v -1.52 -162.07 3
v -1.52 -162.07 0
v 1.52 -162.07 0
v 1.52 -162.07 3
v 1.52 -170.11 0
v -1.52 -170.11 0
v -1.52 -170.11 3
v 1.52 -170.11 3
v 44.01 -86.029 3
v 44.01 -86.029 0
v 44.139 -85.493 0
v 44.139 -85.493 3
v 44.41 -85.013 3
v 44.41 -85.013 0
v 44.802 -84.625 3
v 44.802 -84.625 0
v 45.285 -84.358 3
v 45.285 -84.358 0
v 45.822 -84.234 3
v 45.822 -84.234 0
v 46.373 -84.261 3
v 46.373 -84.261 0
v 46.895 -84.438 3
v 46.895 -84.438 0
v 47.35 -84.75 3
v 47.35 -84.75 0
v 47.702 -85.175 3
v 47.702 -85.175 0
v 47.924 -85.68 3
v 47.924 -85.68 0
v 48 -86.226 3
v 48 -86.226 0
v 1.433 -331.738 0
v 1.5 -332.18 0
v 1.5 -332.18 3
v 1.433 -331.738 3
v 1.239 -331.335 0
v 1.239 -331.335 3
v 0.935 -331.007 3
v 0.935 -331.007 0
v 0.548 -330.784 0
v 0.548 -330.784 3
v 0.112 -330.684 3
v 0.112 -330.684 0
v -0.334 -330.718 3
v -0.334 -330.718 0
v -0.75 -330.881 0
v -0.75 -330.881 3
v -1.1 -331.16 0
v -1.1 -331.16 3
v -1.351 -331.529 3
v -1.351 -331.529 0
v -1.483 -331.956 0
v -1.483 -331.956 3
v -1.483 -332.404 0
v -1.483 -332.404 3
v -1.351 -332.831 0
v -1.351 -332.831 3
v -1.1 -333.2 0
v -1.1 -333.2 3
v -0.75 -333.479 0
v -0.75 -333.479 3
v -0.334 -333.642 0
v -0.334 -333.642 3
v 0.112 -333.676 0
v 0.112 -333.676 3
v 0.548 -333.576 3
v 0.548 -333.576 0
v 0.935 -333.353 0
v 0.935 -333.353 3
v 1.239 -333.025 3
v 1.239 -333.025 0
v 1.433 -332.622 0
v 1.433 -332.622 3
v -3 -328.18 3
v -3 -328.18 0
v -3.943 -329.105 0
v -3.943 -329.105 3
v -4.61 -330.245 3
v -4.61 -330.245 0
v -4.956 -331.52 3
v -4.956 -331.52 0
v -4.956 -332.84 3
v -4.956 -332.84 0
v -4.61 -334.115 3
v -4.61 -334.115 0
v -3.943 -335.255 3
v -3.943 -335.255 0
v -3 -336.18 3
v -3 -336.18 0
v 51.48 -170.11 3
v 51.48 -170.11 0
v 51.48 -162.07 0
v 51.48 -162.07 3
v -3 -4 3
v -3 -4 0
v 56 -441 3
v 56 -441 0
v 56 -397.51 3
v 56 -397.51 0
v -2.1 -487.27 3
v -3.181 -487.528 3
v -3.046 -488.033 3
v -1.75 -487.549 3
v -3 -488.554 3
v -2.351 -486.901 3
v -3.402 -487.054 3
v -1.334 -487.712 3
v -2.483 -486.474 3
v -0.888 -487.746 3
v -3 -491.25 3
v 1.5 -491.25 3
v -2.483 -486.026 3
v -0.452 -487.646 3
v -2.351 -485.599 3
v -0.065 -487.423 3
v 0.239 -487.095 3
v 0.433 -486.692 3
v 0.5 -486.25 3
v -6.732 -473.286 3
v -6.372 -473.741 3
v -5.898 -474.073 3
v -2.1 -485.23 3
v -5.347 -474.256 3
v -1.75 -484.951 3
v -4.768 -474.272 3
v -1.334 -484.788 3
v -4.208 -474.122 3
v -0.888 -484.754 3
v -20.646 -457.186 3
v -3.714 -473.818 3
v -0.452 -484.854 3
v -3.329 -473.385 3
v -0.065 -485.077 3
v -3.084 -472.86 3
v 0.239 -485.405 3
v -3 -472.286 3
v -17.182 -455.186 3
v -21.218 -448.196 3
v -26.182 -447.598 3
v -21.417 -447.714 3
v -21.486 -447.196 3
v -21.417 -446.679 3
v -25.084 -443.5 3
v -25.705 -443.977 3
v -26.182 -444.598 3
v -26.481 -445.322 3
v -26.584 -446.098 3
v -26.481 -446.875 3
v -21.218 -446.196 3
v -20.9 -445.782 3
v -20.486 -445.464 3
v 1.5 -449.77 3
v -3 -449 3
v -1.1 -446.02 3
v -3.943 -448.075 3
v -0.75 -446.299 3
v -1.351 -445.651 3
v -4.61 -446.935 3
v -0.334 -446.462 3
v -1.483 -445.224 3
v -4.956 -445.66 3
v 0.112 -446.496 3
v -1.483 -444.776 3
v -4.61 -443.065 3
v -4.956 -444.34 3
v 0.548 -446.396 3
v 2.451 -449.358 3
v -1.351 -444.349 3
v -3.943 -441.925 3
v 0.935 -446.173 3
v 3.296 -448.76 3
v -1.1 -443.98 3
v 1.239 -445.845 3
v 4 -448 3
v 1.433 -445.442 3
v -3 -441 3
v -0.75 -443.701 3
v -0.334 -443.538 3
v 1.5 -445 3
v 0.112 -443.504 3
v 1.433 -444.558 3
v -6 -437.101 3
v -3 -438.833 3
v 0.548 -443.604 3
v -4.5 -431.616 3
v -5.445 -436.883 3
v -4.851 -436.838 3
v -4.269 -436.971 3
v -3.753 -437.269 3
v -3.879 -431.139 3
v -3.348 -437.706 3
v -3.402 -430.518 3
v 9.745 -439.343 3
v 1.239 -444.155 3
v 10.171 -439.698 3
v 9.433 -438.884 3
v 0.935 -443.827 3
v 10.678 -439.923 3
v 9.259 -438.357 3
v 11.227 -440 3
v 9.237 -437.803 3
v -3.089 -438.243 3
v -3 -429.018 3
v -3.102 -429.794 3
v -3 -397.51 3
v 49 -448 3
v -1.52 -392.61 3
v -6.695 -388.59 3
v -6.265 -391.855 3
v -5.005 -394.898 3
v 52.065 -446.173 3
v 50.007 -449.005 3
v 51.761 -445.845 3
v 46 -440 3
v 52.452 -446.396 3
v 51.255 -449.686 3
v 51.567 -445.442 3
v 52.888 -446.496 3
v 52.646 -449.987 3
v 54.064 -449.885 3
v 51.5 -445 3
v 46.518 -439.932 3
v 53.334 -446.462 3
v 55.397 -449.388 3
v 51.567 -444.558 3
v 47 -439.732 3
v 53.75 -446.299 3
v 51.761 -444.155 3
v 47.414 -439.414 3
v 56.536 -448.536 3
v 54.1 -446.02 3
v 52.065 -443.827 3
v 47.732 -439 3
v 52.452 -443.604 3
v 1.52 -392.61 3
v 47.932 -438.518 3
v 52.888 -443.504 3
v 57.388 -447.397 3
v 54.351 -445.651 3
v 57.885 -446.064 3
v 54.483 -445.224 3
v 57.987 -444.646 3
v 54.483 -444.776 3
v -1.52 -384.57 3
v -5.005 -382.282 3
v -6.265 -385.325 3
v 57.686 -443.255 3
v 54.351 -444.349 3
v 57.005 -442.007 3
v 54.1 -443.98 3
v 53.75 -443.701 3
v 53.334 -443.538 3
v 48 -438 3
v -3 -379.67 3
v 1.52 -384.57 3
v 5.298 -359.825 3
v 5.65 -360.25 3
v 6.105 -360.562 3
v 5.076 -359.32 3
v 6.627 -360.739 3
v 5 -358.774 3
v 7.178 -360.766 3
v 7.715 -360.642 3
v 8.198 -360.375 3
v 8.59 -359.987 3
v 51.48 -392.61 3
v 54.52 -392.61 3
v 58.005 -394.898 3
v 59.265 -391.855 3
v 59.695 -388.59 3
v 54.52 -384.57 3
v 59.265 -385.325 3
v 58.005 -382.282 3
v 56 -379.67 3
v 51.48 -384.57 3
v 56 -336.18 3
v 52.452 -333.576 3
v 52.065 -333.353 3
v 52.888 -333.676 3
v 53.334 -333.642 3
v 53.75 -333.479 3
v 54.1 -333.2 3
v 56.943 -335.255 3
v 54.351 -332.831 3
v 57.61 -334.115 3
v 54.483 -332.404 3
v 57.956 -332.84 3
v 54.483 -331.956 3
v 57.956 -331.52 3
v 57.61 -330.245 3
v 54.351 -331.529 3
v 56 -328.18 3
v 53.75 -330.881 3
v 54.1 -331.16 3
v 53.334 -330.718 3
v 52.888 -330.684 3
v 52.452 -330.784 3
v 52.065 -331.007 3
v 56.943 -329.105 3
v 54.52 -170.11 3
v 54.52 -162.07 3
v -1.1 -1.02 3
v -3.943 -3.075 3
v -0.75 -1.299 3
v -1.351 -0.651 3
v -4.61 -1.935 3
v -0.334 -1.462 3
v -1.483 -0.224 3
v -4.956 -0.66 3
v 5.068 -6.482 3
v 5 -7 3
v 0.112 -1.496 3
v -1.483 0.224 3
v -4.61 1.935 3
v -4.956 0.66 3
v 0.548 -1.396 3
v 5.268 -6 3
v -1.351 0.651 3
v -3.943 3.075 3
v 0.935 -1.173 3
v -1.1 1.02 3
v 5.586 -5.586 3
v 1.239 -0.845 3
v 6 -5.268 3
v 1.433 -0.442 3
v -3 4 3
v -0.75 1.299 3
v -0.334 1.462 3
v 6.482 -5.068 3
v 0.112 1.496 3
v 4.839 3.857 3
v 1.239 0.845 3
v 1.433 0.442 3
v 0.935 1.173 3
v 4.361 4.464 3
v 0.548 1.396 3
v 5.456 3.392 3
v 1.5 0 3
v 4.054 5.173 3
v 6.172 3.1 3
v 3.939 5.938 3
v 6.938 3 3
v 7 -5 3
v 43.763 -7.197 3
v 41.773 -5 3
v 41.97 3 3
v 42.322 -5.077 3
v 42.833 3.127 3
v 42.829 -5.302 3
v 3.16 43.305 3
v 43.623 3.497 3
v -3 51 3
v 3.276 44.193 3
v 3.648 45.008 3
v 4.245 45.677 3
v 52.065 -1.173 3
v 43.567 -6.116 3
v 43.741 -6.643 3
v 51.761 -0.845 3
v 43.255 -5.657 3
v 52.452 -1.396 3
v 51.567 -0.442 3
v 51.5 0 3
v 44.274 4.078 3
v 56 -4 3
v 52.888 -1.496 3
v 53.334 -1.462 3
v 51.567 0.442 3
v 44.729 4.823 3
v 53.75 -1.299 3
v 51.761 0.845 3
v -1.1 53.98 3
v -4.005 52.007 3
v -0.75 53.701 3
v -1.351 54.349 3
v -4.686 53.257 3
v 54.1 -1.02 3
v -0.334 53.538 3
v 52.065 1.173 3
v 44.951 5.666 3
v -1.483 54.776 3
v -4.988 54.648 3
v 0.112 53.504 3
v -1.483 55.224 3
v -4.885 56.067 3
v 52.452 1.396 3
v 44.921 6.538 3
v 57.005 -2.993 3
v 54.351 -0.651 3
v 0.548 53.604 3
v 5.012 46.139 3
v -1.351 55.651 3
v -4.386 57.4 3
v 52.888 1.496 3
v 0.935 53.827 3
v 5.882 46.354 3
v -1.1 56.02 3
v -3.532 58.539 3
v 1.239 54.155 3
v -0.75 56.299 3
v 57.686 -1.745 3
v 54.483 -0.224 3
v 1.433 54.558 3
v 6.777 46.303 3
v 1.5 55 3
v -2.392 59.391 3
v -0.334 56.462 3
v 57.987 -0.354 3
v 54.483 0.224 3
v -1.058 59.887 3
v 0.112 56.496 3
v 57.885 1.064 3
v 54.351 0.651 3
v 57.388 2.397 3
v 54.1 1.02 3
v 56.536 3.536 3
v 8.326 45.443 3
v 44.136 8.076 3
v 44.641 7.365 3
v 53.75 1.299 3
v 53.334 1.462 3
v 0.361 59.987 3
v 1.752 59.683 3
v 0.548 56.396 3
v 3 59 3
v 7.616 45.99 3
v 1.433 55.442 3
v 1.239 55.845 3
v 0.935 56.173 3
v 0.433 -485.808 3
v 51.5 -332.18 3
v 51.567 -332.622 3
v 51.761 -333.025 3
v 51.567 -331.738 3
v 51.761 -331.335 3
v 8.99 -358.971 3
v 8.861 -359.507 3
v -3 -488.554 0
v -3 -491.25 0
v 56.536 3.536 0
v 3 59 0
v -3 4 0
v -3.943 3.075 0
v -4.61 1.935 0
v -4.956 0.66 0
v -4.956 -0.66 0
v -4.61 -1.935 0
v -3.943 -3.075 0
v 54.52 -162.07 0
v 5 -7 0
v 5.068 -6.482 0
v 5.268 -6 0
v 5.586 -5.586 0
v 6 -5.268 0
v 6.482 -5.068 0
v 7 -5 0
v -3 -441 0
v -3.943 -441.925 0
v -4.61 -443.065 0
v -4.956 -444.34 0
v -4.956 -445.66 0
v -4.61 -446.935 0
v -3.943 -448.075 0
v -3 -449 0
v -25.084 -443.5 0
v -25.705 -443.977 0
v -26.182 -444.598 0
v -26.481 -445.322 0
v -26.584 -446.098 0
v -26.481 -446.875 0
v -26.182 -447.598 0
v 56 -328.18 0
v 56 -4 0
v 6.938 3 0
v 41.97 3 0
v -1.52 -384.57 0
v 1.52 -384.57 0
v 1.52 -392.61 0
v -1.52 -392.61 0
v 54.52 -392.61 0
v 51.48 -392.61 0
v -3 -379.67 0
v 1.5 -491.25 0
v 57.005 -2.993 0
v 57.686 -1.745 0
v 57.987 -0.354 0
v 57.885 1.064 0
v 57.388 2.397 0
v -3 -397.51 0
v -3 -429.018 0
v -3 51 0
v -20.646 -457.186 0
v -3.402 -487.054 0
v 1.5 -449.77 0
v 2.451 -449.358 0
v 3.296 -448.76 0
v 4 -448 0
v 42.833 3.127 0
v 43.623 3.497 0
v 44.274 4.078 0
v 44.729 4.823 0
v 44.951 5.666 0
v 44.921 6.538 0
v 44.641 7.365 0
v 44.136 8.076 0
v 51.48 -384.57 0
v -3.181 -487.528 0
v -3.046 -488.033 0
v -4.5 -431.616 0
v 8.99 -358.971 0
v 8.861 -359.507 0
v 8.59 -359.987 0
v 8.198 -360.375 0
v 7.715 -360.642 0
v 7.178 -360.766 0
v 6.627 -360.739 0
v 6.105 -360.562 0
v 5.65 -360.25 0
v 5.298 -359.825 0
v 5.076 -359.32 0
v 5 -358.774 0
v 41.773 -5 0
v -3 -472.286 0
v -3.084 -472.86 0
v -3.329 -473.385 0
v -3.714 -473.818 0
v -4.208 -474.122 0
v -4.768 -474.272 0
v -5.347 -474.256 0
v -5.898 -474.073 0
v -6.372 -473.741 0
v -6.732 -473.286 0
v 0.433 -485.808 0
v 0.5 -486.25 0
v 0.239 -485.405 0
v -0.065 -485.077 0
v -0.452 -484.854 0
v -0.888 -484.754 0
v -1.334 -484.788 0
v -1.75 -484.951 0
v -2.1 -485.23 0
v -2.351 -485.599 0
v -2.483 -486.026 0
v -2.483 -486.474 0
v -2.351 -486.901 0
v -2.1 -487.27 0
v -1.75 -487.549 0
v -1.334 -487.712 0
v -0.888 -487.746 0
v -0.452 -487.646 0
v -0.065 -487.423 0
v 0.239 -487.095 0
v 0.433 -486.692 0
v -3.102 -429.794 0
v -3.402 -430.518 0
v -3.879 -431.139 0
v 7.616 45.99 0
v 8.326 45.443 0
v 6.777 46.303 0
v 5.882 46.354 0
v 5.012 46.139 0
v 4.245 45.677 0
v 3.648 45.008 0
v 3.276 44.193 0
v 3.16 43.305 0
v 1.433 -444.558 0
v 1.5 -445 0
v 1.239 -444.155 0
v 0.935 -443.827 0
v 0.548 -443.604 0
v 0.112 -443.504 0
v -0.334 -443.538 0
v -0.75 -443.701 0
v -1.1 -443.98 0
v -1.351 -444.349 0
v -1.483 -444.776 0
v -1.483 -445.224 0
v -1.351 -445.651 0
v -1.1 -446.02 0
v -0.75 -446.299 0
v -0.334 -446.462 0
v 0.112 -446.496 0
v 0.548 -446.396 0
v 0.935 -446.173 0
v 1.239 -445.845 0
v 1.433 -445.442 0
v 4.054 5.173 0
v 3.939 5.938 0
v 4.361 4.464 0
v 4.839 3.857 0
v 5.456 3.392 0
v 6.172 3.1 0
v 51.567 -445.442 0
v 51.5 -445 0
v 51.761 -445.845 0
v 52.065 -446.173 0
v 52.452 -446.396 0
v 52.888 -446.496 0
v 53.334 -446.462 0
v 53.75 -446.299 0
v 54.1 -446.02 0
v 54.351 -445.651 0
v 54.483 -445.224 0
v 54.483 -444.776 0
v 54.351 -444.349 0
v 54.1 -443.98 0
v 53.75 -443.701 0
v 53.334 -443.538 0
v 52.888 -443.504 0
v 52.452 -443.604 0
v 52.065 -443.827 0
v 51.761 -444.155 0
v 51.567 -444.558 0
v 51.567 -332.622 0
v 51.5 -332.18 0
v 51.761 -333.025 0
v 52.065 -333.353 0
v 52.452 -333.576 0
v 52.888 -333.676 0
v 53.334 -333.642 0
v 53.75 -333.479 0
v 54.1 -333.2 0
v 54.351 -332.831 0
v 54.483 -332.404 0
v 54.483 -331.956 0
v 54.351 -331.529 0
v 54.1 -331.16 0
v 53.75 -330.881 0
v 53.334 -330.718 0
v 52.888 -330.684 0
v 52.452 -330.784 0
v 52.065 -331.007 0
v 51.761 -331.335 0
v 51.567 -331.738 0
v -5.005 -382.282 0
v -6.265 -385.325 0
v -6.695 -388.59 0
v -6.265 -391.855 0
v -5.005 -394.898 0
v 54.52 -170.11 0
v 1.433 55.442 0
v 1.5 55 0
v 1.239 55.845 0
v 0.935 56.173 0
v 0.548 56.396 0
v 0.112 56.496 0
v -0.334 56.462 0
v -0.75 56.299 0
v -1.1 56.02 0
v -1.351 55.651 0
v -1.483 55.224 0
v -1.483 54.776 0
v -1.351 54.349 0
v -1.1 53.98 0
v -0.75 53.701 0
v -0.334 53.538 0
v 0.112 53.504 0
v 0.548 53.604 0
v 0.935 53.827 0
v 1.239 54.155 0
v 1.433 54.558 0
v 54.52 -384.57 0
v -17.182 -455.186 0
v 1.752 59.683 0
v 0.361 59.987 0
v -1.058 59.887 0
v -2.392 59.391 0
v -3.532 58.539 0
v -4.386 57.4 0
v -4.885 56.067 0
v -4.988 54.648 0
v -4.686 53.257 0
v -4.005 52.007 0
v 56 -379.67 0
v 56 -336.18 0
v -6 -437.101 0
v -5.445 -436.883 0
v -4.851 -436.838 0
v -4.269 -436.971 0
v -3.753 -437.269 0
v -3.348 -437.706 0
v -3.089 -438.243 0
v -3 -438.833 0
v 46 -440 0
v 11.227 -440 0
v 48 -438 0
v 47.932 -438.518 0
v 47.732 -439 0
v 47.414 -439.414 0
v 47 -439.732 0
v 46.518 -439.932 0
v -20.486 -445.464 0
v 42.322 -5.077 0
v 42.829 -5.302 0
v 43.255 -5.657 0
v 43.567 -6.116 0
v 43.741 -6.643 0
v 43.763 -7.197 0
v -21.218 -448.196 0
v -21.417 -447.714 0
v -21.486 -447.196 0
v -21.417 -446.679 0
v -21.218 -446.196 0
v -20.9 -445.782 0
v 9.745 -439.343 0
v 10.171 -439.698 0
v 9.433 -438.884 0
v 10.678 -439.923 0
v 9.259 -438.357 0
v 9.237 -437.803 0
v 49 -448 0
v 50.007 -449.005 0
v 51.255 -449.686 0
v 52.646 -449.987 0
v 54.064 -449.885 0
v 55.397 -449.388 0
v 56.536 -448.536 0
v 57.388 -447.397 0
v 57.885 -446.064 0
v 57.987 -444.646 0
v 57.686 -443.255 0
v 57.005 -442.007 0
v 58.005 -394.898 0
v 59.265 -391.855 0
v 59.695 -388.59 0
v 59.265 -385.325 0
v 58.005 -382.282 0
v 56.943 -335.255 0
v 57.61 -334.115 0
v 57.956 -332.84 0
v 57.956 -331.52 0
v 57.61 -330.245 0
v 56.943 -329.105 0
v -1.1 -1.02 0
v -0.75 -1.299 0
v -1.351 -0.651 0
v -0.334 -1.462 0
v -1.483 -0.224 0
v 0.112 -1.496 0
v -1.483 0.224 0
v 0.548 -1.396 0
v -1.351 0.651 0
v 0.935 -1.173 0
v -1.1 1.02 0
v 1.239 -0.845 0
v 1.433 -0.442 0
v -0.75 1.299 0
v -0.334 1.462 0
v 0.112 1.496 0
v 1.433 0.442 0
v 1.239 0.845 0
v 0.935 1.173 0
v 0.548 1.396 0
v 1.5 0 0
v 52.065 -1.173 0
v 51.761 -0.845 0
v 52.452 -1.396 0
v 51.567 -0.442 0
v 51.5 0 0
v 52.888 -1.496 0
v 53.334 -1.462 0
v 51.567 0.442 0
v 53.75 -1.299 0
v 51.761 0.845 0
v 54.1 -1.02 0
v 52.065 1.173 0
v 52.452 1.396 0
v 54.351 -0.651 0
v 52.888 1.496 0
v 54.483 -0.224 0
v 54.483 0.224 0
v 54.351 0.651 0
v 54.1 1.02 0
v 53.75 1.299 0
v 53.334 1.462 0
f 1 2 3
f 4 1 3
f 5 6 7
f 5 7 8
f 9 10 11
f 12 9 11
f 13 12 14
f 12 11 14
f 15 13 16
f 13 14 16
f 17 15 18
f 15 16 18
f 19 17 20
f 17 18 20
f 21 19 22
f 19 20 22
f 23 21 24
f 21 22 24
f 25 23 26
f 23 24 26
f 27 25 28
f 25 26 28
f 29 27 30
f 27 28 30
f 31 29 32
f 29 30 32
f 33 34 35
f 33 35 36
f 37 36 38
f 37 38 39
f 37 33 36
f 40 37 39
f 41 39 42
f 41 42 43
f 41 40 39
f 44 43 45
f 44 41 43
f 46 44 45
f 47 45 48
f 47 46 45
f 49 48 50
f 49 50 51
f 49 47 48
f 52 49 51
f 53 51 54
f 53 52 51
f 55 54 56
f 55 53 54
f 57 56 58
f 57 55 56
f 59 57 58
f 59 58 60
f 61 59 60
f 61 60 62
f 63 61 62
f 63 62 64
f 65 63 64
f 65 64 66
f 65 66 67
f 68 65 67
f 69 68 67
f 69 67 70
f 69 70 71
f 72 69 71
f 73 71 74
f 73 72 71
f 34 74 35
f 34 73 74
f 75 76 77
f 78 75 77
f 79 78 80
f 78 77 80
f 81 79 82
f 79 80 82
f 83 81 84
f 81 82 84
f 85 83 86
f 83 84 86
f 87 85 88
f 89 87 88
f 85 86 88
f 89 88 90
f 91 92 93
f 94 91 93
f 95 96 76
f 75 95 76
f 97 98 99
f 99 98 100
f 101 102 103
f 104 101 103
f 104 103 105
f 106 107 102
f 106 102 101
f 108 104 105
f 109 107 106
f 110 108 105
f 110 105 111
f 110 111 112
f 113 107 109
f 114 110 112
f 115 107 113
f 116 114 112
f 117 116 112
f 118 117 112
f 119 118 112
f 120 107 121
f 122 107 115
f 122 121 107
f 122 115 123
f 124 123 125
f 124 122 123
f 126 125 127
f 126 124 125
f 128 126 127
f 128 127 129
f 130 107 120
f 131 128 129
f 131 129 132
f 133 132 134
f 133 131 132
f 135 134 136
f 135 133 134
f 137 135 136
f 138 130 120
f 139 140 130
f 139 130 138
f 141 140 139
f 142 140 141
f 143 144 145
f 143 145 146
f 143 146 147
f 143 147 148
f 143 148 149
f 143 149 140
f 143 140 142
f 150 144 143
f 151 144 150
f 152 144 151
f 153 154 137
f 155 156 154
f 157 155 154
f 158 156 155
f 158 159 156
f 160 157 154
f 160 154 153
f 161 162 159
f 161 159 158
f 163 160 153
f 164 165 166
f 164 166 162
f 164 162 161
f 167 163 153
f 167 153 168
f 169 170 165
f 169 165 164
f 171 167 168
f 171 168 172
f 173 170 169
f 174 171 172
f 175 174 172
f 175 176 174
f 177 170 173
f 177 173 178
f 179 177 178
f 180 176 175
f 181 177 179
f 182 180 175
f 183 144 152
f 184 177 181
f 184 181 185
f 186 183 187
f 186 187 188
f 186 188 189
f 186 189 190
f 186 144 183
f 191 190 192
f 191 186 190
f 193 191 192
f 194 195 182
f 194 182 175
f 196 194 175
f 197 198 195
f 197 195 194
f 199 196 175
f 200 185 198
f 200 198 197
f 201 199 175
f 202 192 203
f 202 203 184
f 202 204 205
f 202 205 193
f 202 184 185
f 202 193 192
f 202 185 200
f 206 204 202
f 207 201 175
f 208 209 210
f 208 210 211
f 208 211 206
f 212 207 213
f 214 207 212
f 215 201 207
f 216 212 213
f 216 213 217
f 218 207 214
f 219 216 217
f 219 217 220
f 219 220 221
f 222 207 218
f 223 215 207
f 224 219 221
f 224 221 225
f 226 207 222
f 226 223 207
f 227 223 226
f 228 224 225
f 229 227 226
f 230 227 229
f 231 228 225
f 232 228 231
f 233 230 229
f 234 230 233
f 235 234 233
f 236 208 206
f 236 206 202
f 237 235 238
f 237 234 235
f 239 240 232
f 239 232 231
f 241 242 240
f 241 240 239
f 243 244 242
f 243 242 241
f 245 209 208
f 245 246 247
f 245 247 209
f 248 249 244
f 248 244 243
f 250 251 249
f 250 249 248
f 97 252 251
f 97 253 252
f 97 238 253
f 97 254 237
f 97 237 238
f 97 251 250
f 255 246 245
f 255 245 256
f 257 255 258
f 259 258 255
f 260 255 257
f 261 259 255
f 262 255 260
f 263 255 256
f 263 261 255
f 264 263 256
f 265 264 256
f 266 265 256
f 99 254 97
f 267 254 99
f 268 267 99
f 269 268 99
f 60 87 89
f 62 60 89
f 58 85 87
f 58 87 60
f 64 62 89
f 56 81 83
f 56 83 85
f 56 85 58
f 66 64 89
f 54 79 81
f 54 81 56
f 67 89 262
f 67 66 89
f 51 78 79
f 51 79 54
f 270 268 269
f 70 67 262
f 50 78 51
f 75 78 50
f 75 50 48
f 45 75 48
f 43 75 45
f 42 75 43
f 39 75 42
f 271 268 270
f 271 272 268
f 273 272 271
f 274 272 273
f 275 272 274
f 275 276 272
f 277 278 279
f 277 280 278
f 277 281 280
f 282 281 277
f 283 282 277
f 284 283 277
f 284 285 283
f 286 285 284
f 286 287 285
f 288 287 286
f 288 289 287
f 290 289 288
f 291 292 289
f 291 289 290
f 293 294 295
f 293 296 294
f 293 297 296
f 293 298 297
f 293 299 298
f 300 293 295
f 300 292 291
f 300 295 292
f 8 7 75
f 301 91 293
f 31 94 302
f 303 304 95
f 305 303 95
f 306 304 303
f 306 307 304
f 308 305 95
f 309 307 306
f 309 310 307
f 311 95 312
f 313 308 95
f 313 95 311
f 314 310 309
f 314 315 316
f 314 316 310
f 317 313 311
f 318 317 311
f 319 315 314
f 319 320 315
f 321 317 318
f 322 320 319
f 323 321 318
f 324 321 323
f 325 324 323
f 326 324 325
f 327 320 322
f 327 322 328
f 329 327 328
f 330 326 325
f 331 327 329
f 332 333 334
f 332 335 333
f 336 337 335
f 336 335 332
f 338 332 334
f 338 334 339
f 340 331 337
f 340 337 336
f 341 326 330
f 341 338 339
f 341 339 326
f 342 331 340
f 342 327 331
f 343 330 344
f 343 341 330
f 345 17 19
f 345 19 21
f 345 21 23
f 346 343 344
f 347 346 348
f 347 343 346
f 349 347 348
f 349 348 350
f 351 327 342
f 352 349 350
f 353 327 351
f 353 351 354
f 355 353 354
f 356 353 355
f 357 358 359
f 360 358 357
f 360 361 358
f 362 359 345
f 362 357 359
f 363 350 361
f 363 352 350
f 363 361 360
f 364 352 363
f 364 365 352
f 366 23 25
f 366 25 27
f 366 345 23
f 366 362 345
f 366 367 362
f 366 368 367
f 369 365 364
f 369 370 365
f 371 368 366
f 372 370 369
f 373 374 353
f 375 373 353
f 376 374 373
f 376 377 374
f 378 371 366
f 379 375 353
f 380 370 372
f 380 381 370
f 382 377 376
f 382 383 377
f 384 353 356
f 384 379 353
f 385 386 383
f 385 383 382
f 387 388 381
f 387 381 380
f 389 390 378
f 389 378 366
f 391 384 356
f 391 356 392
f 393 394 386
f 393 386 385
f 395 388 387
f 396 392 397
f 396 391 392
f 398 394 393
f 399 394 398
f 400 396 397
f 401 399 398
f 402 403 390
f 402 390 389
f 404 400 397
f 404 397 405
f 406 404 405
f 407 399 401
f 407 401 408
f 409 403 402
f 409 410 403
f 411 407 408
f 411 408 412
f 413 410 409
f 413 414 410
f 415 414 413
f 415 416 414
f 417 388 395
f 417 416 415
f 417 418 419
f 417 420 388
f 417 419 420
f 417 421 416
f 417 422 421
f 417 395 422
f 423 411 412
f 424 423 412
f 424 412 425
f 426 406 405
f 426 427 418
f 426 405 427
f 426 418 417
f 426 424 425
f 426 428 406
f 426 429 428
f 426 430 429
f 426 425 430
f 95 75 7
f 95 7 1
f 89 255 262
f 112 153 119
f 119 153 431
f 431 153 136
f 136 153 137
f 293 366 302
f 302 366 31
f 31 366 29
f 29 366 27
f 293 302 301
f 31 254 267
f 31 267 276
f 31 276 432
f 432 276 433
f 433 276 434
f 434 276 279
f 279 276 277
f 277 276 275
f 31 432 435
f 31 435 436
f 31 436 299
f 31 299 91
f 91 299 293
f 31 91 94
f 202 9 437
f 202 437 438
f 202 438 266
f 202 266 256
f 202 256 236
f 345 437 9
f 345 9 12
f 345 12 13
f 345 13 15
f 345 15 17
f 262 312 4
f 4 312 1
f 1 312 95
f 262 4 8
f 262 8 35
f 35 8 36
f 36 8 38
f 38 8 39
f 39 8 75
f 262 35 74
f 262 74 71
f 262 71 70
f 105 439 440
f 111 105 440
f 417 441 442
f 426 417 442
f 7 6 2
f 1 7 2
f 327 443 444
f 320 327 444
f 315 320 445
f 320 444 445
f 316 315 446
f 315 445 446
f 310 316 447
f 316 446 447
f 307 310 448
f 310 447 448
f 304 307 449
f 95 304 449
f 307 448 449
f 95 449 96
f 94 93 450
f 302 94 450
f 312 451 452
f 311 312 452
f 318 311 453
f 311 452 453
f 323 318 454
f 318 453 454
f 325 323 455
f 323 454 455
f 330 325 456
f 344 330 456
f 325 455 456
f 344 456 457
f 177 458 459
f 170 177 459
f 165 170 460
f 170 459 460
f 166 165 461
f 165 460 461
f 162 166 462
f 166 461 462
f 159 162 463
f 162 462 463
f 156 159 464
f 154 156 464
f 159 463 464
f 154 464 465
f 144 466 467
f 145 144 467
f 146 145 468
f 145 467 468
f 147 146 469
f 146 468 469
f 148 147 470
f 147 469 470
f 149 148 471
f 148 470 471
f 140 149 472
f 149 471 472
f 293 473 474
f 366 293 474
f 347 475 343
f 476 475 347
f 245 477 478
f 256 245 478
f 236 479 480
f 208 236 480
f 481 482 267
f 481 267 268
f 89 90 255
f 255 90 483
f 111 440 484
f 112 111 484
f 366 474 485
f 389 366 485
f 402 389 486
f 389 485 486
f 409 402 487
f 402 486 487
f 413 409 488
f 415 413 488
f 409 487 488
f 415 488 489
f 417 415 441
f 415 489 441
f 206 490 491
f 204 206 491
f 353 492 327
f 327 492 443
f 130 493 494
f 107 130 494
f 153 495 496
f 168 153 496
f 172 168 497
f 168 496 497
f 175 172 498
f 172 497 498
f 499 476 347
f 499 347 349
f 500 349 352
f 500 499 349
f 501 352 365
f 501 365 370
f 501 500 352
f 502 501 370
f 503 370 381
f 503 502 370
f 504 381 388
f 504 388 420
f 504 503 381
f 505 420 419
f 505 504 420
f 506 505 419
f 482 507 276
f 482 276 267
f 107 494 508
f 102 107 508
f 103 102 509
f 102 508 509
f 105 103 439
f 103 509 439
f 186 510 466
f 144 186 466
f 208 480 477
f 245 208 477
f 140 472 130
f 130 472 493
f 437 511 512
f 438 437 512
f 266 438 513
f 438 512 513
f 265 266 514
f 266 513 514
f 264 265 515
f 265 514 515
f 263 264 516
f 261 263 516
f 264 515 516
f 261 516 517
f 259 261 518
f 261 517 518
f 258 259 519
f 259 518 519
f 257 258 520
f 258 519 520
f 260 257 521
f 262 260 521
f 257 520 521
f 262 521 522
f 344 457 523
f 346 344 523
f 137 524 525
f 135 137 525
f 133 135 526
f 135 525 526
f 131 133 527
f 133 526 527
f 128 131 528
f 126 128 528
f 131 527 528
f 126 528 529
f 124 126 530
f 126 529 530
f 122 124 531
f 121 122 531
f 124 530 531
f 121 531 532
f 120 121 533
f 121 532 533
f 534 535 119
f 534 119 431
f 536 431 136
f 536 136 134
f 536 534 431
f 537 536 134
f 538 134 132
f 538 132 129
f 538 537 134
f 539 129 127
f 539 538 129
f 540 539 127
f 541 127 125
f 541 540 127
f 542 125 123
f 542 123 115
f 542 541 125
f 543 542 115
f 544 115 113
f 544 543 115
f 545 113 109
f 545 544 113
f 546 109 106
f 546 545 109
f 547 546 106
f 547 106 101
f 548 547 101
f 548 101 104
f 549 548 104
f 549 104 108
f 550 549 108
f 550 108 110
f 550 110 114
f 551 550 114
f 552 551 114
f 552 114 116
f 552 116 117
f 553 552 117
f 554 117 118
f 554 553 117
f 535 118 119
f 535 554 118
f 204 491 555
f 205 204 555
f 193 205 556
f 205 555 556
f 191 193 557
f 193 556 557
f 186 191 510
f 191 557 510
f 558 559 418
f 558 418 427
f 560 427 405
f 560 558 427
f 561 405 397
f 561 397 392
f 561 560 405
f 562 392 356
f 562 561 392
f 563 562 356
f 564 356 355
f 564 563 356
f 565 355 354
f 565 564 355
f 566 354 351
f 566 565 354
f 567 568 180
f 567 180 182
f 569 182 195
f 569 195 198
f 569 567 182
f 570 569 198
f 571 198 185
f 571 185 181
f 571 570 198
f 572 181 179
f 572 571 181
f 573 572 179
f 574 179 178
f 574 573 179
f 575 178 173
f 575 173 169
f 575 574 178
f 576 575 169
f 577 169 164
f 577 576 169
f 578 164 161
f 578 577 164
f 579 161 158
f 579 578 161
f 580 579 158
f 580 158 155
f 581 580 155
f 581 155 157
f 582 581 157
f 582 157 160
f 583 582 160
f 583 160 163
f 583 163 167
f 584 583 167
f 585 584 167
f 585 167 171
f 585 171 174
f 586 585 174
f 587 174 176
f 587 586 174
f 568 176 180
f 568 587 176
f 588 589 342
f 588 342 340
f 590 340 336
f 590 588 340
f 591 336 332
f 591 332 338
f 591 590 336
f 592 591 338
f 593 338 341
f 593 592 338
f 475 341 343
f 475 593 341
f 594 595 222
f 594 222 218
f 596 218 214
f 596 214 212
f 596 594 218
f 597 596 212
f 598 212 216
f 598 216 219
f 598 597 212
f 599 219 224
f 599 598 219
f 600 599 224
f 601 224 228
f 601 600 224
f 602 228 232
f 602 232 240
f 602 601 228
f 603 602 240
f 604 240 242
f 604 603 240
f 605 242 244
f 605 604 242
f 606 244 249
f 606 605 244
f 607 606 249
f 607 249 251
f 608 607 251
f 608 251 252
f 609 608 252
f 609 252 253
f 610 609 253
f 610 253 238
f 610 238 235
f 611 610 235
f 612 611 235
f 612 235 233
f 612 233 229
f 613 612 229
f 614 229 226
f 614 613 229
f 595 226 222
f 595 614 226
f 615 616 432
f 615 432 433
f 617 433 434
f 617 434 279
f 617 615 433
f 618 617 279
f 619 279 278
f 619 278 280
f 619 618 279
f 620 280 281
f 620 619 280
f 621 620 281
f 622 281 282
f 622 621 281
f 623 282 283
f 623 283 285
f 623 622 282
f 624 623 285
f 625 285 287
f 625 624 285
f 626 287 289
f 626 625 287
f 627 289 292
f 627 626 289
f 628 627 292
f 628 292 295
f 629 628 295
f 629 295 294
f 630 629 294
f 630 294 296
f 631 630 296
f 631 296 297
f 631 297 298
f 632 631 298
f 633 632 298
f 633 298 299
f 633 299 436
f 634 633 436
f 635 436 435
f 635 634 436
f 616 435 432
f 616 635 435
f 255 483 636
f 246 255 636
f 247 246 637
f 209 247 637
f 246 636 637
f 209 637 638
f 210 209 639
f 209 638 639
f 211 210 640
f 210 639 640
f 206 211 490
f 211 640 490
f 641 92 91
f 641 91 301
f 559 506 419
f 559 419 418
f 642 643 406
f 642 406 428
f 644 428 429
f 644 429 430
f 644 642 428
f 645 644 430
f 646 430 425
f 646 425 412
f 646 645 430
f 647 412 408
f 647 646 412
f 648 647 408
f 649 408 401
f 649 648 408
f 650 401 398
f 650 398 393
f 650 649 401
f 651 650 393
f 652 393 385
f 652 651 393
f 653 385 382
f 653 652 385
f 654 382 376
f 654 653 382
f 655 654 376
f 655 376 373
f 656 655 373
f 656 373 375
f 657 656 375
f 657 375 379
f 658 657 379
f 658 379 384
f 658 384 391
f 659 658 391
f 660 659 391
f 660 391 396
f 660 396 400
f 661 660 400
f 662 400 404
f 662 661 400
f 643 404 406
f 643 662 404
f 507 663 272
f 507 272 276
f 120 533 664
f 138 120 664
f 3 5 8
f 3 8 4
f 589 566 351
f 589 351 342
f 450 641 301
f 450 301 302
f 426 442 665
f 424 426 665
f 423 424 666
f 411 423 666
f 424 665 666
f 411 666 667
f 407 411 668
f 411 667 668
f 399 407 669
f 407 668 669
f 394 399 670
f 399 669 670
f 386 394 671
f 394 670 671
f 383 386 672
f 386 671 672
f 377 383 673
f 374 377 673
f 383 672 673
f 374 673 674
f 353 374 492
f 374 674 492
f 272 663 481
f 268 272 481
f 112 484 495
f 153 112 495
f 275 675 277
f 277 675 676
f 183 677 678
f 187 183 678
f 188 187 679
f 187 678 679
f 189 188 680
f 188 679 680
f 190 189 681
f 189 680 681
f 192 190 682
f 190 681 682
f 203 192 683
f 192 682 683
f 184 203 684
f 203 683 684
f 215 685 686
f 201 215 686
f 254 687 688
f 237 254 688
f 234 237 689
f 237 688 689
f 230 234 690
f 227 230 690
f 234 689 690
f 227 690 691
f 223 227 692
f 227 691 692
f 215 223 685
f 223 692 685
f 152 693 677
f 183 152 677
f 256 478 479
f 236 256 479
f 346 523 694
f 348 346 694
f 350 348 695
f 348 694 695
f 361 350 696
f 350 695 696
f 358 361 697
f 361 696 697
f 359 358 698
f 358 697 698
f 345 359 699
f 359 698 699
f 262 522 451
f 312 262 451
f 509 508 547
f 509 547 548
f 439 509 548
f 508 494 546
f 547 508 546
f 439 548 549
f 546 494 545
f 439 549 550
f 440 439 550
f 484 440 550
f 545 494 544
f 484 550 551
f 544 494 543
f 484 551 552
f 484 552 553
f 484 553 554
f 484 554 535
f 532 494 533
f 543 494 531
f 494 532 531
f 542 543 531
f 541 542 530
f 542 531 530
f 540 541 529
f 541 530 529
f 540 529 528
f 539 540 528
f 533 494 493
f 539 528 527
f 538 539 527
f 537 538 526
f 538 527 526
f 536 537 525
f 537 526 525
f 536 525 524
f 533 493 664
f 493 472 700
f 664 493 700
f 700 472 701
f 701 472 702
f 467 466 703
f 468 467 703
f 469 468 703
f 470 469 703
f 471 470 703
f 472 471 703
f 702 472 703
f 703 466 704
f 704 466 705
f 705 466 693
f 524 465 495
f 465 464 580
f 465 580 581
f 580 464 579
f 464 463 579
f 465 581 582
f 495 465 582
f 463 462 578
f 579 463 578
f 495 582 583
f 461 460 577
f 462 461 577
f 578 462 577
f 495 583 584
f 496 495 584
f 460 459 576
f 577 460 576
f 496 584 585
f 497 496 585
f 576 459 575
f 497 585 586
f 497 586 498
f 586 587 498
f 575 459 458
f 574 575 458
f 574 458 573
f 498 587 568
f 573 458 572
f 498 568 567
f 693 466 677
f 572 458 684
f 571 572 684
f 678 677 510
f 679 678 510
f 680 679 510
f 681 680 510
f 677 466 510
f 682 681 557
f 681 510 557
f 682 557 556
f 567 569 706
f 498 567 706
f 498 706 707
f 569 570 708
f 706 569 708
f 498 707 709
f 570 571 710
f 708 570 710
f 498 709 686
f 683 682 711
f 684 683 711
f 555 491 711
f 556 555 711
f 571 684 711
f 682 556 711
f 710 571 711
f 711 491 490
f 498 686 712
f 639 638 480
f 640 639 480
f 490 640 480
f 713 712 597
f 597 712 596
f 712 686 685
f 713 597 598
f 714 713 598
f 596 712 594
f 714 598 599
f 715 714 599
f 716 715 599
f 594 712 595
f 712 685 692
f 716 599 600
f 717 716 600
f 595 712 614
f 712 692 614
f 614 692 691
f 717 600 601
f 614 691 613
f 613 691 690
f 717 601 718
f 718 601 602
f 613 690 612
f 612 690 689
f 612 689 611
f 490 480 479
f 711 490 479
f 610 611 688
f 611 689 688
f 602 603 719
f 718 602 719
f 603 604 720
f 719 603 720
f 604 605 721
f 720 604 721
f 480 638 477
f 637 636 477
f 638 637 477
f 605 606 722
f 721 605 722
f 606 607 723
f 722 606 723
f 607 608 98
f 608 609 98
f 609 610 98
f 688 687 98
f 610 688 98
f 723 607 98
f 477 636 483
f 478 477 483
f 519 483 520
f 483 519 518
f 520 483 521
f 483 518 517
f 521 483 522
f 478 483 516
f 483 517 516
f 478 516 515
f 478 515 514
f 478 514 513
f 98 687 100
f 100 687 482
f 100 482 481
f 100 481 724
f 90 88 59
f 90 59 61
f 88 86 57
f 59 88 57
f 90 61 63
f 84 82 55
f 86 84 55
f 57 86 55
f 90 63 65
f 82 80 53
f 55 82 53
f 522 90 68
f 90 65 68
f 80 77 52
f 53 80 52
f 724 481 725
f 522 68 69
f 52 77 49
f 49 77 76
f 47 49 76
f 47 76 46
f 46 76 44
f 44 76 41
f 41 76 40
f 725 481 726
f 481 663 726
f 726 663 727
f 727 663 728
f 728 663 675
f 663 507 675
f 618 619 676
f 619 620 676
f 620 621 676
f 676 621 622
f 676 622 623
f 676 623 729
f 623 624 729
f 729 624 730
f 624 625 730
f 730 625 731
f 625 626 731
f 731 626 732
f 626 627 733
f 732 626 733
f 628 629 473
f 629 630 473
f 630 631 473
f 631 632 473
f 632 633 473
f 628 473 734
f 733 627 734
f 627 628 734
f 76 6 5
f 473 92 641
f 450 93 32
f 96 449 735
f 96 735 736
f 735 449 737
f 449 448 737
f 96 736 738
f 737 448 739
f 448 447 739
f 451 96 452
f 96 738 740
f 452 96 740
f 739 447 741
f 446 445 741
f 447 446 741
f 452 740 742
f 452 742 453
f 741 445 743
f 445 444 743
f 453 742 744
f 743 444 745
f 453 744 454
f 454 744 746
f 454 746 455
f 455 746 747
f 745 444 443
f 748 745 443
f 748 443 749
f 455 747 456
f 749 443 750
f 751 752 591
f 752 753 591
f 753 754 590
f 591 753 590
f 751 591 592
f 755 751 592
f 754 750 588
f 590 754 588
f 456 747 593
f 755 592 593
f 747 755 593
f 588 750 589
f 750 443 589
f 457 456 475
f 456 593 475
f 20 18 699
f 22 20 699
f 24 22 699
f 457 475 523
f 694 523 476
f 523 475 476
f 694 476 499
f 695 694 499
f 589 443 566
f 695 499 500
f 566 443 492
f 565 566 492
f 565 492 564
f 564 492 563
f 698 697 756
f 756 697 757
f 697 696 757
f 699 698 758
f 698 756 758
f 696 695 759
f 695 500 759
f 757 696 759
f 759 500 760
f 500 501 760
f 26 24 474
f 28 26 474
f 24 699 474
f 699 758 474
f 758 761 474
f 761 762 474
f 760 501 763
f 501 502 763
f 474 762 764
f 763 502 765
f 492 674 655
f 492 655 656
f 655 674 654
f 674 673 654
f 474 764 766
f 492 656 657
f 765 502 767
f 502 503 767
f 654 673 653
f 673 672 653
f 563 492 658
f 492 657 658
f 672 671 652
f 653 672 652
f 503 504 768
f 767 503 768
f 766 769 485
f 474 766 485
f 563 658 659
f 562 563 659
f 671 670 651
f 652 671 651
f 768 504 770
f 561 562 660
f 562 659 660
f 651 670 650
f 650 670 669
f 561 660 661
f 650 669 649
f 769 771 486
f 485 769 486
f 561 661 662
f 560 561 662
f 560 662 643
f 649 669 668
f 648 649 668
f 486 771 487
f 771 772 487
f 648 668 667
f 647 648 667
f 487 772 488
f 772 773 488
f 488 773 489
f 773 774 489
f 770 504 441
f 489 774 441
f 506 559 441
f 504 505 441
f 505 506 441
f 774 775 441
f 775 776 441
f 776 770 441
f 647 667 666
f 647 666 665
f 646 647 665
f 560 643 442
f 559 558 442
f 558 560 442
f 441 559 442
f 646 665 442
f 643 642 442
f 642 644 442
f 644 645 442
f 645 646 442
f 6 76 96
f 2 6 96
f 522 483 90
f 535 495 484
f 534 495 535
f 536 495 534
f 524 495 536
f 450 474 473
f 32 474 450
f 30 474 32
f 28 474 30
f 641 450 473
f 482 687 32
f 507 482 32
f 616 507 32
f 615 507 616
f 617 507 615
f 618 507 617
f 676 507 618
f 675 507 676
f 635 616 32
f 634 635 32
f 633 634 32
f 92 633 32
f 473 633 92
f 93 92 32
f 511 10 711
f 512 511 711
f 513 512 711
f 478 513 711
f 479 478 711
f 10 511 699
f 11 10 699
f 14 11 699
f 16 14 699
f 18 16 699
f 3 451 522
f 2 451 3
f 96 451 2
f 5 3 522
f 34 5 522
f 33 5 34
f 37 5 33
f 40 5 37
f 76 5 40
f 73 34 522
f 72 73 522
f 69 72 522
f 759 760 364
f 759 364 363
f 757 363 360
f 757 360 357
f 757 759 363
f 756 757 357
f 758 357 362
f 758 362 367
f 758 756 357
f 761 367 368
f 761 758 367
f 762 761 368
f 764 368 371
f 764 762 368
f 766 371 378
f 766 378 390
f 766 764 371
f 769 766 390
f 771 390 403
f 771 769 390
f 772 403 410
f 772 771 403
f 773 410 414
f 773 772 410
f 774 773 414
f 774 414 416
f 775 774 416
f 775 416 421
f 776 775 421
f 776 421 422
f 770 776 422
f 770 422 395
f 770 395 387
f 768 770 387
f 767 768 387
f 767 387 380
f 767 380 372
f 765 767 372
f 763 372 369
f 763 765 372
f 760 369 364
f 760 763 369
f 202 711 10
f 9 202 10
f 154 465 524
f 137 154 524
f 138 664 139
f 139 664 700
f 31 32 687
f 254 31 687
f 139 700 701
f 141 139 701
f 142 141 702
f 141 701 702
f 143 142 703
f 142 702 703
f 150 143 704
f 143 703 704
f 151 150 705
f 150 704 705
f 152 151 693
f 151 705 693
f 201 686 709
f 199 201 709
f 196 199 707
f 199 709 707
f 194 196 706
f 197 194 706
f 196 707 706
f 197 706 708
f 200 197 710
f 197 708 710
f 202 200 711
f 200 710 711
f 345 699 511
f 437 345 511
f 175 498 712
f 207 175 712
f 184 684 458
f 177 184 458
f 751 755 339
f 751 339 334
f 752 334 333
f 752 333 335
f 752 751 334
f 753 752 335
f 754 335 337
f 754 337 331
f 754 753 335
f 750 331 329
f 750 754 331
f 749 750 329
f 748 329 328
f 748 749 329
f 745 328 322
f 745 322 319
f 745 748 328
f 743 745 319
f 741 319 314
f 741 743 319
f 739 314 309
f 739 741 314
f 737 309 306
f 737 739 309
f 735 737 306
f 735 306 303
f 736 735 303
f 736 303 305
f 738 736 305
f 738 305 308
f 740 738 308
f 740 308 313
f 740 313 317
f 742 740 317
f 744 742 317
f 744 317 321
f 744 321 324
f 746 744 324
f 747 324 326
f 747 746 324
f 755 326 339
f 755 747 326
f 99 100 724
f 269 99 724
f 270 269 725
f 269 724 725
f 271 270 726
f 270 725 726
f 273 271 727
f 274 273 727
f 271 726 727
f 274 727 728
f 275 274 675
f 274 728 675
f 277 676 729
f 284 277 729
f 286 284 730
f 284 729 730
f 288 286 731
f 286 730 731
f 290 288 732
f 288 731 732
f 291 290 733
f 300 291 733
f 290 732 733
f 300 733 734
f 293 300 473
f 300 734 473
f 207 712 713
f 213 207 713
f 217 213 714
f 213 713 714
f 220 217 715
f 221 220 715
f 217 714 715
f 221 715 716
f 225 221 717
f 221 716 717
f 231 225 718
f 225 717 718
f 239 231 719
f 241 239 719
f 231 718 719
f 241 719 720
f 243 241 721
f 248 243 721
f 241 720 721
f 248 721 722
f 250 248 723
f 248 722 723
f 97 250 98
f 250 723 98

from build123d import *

# Parameters (mm, degrees)
SKETCH_1_R      = 1.5
SKETCH_1_W      = 3.04
SKETCH_1_H      = 8.04
EXTRUDE_1_DEPTH = 3


with BuildPart() as part:
    # 草图1 → 凸台-拉伸1 (new body)
    with BuildSketch(Plane.XY):
        with BuildLine():
            Line((-3, -4), (-3, -328.18))
            ThreePointArc((-3, -328.18), (-5, -332.18), (-3, -336.18))
            Line((-3, -336.18), (-3, -379.66982063))
            ThreePointArc((-3, -379.66982063), (-6.694859274, -388.59), (-3, -397.51017937))
            Line((-3, -397.51017937), (-3, -429.017949192))
            ThreePointArc((-3, -429.017949192), (-3.401923789, -430.517949192), (-4.5, -431.616025404))
            Line((-4.5, -431.616025404), (-25.083647797, -443.5))
            ThreePointArc((-25.083647797, -443.5), (-26.481425275, -445.321619076), (-26.181724008, -447.598076211))
            Line((-26.181724008, -447.598076211), (-20.646282865, -457.185741513))
            Line((-20.646282865, -457.185741513), (-3.401923789, -487.053847577))
            ThreePointArc((-3.401923789, -487.053847577), (-3.102222521, -487.777390442), (-3, -488.553847577))
            Line((-3, -488.553847577), (-3, -491.25))
            Line((-3, -491.25), (1.5, -491.25))
            Line((1.5, -491.25), (1.5, -487.35037357))
            Line((1.5, -487.35037357), (1.5, -485.14962643))
            Line((1.5, -485.14962643), (1.5, -449.769696007))
            ThreePointArc((1.5, -449.769696007), (2.888850289, -449.080997918), (4, -448))
            Line((4, -448), (49, -448))
            ThreePointArc((49, -448), (56.535533906, -448.535533906), (56, -441))
            Line((56, -441), (56, -397.51017937))
            ThreePointArc((56, -397.51017937), (59.694859274, -388.59), (56, -379.66982063))
            Line((56, -379.66982063), (56, -336.18))
            ThreePointArc((56, -336.18), (58, -332.18), (56, -328.18))
            Line((56, -328.18), (56, -4))
            ThreePointArc((56, -4), (57.987421044, -0.3544451), (56.535533906, 3.535533906))
            Line((56.535533906, 3.535533906), (3, 59))
            ThreePointArc((3, 59), (-4, 58), (-3, 51))
            Line((-3, 51), (-3, 4))
            ThreePointArc((-3, 4), (-5, 0), (-3, -4))
        make_face()
        Circle(SKETCH_1_R, mode=Mode.SUBTRACT)
        with Locations((0, -445)):
            Circle(SKETCH_1_R, mode=Mode.SUBTRACT)
        with Locations((0, -332.18)):
            Circle(SKETCH_1_R, mode=Mode.SUBTRACT)
        with Locations(Location((53, -332.18, 0), (0, 0, 180))):
            Circle(SKETCH_1_R, mode=Mode.SUBTRACT)
        with Locations(Location((53, -445, 0), (0, 0, 180))):
            Circle(SKETCH_1_R, mode=Mode.SUBTRACT)
        with Locations(Location((53, 0, 0), (0, 0, 180))):
            Circle(SKETCH_1_R, mode=Mode.SUBTRACT)
        with Locations((0, 55)):
            Circle(SKETCH_1_R, mode=Mode.SUBTRACT)
        with Locations((-1, -486.25)):
            Circle(SKETCH_1_R, mode=Mode.SUBTRACT)
        with BuildLine():
            Line((6.938150971, 3), (41.969807465, 3))
            ThreePointArc((41.969807465, 3), (44.729078046, 4.822534134), (44.135772081, 8.07571609))
            Line((44.135772081, 8.07571609), (8.325634331, 45.44281635))
            ThreePointArc((8.325634331, 45.44281635), (5.012233456, 46.138993121), (3.160320545, 43.30461382))
            Line((3.160320545, 43.30461382), (3.938801801, 5.937513559))
            ThreePointArc((3.938801801, 5.937513559), (4.839039174, 3.85670122), (6.938150971, 3))
        make_face(mode=Mode.SUBTRACT)
        with BuildLine():
            Line((48, -86.226063366), (48, -438))
            ThreePointArc((48, -438), (47.414213562, -439.414213562), (46, -440))
            Line((46, -440), (11.226944195, -440))
            ThreePointArc((11.226944195, -440), (9.744803089, -439.342854326), (9.236644598, -437.803257741))
            Line((9.236644598, -437.803257741), (44.009700404, -86.029321107))
            ThreePointArc((44.009700404, -86.029321107), (46.098490627, -84.228489939), (48, -86.226063366))
        make_face(mode=Mode.SUBTRACT)
        with BuildLine():
            Line((43.763355402, -7.196742259), (8.990299596, -358.970678893))
            ThreePointArc((8.990299596, -358.970678893), (6.901509373, -360.771510061), (5, -358.773936634))
            Line((5, -358.773936634), (5, -7))
            ThreePointArc((5, -7), (5.585786438, -5.585786438), (7, -5))
            Line((7, -5), (41.773055805, -5))
            ThreePointArc((41.773055805, -5), (43.255196911, -5.657145674), (43.763355402, -7.196742259))
        make_face(mode=Mode.SUBTRACT)
        with BuildLine():
            Line((-17.18218125, -455.185741513), (-21.217622393, -448.196152423))
            ThreePointArc((-21.217622393, -448.196152423), (-21.417423238, -446.678514333), (-20.485571585, -445.464101615))
            Line((-20.485571585, -445.464101615), (-6, -437.100852961))
            ThreePointArc((-6, -437.100852961), (-4, -437.100852961), (-3, -438.832903769))
            Line((-3, -438.832903769), (-3, -441))
            ThreePointArc((-3, -441), (-5, -445), (-3, -449))
            Line((-3, -449), (-3, -472.285898385))
            ThreePointArc((-3, -472.285898385), (-4.48236191, -474.217750037), (-6.732050808, -473.285898385))
            Line((-6.732050808, -473.285898385), (-17.18218125, -455.185741513))
        make_face(mode=Mode.SUBTRACT)
        Polygon((-1.52, -388.59), (-1.52, -384.57), (1.52, -384.57), (1.52, -392.61), (-1.52, -392.61), align=None, mode=Mode.SUBTRACT)
        Polygon((54.52, -392.61), (54.52, -388.59), (54.52, -384.57), (51.48, -384.57), (51.48, -392.61), align=None, mode=Mode.SUBTRACT)
        with Locations((53, -166.09)):
            Rectangle(SKETCH_1_W, SKETCH_1_H, mode=Mode.SUBTRACT)
        with Locations((0, -166.09)):
            Rectangle(SKETCH_1_W, SKETCH_1_H, mode=Mode.SUBTRACT)
    extrude(amount=EXTRUDE_1_DEPTH)


solid = part.part
